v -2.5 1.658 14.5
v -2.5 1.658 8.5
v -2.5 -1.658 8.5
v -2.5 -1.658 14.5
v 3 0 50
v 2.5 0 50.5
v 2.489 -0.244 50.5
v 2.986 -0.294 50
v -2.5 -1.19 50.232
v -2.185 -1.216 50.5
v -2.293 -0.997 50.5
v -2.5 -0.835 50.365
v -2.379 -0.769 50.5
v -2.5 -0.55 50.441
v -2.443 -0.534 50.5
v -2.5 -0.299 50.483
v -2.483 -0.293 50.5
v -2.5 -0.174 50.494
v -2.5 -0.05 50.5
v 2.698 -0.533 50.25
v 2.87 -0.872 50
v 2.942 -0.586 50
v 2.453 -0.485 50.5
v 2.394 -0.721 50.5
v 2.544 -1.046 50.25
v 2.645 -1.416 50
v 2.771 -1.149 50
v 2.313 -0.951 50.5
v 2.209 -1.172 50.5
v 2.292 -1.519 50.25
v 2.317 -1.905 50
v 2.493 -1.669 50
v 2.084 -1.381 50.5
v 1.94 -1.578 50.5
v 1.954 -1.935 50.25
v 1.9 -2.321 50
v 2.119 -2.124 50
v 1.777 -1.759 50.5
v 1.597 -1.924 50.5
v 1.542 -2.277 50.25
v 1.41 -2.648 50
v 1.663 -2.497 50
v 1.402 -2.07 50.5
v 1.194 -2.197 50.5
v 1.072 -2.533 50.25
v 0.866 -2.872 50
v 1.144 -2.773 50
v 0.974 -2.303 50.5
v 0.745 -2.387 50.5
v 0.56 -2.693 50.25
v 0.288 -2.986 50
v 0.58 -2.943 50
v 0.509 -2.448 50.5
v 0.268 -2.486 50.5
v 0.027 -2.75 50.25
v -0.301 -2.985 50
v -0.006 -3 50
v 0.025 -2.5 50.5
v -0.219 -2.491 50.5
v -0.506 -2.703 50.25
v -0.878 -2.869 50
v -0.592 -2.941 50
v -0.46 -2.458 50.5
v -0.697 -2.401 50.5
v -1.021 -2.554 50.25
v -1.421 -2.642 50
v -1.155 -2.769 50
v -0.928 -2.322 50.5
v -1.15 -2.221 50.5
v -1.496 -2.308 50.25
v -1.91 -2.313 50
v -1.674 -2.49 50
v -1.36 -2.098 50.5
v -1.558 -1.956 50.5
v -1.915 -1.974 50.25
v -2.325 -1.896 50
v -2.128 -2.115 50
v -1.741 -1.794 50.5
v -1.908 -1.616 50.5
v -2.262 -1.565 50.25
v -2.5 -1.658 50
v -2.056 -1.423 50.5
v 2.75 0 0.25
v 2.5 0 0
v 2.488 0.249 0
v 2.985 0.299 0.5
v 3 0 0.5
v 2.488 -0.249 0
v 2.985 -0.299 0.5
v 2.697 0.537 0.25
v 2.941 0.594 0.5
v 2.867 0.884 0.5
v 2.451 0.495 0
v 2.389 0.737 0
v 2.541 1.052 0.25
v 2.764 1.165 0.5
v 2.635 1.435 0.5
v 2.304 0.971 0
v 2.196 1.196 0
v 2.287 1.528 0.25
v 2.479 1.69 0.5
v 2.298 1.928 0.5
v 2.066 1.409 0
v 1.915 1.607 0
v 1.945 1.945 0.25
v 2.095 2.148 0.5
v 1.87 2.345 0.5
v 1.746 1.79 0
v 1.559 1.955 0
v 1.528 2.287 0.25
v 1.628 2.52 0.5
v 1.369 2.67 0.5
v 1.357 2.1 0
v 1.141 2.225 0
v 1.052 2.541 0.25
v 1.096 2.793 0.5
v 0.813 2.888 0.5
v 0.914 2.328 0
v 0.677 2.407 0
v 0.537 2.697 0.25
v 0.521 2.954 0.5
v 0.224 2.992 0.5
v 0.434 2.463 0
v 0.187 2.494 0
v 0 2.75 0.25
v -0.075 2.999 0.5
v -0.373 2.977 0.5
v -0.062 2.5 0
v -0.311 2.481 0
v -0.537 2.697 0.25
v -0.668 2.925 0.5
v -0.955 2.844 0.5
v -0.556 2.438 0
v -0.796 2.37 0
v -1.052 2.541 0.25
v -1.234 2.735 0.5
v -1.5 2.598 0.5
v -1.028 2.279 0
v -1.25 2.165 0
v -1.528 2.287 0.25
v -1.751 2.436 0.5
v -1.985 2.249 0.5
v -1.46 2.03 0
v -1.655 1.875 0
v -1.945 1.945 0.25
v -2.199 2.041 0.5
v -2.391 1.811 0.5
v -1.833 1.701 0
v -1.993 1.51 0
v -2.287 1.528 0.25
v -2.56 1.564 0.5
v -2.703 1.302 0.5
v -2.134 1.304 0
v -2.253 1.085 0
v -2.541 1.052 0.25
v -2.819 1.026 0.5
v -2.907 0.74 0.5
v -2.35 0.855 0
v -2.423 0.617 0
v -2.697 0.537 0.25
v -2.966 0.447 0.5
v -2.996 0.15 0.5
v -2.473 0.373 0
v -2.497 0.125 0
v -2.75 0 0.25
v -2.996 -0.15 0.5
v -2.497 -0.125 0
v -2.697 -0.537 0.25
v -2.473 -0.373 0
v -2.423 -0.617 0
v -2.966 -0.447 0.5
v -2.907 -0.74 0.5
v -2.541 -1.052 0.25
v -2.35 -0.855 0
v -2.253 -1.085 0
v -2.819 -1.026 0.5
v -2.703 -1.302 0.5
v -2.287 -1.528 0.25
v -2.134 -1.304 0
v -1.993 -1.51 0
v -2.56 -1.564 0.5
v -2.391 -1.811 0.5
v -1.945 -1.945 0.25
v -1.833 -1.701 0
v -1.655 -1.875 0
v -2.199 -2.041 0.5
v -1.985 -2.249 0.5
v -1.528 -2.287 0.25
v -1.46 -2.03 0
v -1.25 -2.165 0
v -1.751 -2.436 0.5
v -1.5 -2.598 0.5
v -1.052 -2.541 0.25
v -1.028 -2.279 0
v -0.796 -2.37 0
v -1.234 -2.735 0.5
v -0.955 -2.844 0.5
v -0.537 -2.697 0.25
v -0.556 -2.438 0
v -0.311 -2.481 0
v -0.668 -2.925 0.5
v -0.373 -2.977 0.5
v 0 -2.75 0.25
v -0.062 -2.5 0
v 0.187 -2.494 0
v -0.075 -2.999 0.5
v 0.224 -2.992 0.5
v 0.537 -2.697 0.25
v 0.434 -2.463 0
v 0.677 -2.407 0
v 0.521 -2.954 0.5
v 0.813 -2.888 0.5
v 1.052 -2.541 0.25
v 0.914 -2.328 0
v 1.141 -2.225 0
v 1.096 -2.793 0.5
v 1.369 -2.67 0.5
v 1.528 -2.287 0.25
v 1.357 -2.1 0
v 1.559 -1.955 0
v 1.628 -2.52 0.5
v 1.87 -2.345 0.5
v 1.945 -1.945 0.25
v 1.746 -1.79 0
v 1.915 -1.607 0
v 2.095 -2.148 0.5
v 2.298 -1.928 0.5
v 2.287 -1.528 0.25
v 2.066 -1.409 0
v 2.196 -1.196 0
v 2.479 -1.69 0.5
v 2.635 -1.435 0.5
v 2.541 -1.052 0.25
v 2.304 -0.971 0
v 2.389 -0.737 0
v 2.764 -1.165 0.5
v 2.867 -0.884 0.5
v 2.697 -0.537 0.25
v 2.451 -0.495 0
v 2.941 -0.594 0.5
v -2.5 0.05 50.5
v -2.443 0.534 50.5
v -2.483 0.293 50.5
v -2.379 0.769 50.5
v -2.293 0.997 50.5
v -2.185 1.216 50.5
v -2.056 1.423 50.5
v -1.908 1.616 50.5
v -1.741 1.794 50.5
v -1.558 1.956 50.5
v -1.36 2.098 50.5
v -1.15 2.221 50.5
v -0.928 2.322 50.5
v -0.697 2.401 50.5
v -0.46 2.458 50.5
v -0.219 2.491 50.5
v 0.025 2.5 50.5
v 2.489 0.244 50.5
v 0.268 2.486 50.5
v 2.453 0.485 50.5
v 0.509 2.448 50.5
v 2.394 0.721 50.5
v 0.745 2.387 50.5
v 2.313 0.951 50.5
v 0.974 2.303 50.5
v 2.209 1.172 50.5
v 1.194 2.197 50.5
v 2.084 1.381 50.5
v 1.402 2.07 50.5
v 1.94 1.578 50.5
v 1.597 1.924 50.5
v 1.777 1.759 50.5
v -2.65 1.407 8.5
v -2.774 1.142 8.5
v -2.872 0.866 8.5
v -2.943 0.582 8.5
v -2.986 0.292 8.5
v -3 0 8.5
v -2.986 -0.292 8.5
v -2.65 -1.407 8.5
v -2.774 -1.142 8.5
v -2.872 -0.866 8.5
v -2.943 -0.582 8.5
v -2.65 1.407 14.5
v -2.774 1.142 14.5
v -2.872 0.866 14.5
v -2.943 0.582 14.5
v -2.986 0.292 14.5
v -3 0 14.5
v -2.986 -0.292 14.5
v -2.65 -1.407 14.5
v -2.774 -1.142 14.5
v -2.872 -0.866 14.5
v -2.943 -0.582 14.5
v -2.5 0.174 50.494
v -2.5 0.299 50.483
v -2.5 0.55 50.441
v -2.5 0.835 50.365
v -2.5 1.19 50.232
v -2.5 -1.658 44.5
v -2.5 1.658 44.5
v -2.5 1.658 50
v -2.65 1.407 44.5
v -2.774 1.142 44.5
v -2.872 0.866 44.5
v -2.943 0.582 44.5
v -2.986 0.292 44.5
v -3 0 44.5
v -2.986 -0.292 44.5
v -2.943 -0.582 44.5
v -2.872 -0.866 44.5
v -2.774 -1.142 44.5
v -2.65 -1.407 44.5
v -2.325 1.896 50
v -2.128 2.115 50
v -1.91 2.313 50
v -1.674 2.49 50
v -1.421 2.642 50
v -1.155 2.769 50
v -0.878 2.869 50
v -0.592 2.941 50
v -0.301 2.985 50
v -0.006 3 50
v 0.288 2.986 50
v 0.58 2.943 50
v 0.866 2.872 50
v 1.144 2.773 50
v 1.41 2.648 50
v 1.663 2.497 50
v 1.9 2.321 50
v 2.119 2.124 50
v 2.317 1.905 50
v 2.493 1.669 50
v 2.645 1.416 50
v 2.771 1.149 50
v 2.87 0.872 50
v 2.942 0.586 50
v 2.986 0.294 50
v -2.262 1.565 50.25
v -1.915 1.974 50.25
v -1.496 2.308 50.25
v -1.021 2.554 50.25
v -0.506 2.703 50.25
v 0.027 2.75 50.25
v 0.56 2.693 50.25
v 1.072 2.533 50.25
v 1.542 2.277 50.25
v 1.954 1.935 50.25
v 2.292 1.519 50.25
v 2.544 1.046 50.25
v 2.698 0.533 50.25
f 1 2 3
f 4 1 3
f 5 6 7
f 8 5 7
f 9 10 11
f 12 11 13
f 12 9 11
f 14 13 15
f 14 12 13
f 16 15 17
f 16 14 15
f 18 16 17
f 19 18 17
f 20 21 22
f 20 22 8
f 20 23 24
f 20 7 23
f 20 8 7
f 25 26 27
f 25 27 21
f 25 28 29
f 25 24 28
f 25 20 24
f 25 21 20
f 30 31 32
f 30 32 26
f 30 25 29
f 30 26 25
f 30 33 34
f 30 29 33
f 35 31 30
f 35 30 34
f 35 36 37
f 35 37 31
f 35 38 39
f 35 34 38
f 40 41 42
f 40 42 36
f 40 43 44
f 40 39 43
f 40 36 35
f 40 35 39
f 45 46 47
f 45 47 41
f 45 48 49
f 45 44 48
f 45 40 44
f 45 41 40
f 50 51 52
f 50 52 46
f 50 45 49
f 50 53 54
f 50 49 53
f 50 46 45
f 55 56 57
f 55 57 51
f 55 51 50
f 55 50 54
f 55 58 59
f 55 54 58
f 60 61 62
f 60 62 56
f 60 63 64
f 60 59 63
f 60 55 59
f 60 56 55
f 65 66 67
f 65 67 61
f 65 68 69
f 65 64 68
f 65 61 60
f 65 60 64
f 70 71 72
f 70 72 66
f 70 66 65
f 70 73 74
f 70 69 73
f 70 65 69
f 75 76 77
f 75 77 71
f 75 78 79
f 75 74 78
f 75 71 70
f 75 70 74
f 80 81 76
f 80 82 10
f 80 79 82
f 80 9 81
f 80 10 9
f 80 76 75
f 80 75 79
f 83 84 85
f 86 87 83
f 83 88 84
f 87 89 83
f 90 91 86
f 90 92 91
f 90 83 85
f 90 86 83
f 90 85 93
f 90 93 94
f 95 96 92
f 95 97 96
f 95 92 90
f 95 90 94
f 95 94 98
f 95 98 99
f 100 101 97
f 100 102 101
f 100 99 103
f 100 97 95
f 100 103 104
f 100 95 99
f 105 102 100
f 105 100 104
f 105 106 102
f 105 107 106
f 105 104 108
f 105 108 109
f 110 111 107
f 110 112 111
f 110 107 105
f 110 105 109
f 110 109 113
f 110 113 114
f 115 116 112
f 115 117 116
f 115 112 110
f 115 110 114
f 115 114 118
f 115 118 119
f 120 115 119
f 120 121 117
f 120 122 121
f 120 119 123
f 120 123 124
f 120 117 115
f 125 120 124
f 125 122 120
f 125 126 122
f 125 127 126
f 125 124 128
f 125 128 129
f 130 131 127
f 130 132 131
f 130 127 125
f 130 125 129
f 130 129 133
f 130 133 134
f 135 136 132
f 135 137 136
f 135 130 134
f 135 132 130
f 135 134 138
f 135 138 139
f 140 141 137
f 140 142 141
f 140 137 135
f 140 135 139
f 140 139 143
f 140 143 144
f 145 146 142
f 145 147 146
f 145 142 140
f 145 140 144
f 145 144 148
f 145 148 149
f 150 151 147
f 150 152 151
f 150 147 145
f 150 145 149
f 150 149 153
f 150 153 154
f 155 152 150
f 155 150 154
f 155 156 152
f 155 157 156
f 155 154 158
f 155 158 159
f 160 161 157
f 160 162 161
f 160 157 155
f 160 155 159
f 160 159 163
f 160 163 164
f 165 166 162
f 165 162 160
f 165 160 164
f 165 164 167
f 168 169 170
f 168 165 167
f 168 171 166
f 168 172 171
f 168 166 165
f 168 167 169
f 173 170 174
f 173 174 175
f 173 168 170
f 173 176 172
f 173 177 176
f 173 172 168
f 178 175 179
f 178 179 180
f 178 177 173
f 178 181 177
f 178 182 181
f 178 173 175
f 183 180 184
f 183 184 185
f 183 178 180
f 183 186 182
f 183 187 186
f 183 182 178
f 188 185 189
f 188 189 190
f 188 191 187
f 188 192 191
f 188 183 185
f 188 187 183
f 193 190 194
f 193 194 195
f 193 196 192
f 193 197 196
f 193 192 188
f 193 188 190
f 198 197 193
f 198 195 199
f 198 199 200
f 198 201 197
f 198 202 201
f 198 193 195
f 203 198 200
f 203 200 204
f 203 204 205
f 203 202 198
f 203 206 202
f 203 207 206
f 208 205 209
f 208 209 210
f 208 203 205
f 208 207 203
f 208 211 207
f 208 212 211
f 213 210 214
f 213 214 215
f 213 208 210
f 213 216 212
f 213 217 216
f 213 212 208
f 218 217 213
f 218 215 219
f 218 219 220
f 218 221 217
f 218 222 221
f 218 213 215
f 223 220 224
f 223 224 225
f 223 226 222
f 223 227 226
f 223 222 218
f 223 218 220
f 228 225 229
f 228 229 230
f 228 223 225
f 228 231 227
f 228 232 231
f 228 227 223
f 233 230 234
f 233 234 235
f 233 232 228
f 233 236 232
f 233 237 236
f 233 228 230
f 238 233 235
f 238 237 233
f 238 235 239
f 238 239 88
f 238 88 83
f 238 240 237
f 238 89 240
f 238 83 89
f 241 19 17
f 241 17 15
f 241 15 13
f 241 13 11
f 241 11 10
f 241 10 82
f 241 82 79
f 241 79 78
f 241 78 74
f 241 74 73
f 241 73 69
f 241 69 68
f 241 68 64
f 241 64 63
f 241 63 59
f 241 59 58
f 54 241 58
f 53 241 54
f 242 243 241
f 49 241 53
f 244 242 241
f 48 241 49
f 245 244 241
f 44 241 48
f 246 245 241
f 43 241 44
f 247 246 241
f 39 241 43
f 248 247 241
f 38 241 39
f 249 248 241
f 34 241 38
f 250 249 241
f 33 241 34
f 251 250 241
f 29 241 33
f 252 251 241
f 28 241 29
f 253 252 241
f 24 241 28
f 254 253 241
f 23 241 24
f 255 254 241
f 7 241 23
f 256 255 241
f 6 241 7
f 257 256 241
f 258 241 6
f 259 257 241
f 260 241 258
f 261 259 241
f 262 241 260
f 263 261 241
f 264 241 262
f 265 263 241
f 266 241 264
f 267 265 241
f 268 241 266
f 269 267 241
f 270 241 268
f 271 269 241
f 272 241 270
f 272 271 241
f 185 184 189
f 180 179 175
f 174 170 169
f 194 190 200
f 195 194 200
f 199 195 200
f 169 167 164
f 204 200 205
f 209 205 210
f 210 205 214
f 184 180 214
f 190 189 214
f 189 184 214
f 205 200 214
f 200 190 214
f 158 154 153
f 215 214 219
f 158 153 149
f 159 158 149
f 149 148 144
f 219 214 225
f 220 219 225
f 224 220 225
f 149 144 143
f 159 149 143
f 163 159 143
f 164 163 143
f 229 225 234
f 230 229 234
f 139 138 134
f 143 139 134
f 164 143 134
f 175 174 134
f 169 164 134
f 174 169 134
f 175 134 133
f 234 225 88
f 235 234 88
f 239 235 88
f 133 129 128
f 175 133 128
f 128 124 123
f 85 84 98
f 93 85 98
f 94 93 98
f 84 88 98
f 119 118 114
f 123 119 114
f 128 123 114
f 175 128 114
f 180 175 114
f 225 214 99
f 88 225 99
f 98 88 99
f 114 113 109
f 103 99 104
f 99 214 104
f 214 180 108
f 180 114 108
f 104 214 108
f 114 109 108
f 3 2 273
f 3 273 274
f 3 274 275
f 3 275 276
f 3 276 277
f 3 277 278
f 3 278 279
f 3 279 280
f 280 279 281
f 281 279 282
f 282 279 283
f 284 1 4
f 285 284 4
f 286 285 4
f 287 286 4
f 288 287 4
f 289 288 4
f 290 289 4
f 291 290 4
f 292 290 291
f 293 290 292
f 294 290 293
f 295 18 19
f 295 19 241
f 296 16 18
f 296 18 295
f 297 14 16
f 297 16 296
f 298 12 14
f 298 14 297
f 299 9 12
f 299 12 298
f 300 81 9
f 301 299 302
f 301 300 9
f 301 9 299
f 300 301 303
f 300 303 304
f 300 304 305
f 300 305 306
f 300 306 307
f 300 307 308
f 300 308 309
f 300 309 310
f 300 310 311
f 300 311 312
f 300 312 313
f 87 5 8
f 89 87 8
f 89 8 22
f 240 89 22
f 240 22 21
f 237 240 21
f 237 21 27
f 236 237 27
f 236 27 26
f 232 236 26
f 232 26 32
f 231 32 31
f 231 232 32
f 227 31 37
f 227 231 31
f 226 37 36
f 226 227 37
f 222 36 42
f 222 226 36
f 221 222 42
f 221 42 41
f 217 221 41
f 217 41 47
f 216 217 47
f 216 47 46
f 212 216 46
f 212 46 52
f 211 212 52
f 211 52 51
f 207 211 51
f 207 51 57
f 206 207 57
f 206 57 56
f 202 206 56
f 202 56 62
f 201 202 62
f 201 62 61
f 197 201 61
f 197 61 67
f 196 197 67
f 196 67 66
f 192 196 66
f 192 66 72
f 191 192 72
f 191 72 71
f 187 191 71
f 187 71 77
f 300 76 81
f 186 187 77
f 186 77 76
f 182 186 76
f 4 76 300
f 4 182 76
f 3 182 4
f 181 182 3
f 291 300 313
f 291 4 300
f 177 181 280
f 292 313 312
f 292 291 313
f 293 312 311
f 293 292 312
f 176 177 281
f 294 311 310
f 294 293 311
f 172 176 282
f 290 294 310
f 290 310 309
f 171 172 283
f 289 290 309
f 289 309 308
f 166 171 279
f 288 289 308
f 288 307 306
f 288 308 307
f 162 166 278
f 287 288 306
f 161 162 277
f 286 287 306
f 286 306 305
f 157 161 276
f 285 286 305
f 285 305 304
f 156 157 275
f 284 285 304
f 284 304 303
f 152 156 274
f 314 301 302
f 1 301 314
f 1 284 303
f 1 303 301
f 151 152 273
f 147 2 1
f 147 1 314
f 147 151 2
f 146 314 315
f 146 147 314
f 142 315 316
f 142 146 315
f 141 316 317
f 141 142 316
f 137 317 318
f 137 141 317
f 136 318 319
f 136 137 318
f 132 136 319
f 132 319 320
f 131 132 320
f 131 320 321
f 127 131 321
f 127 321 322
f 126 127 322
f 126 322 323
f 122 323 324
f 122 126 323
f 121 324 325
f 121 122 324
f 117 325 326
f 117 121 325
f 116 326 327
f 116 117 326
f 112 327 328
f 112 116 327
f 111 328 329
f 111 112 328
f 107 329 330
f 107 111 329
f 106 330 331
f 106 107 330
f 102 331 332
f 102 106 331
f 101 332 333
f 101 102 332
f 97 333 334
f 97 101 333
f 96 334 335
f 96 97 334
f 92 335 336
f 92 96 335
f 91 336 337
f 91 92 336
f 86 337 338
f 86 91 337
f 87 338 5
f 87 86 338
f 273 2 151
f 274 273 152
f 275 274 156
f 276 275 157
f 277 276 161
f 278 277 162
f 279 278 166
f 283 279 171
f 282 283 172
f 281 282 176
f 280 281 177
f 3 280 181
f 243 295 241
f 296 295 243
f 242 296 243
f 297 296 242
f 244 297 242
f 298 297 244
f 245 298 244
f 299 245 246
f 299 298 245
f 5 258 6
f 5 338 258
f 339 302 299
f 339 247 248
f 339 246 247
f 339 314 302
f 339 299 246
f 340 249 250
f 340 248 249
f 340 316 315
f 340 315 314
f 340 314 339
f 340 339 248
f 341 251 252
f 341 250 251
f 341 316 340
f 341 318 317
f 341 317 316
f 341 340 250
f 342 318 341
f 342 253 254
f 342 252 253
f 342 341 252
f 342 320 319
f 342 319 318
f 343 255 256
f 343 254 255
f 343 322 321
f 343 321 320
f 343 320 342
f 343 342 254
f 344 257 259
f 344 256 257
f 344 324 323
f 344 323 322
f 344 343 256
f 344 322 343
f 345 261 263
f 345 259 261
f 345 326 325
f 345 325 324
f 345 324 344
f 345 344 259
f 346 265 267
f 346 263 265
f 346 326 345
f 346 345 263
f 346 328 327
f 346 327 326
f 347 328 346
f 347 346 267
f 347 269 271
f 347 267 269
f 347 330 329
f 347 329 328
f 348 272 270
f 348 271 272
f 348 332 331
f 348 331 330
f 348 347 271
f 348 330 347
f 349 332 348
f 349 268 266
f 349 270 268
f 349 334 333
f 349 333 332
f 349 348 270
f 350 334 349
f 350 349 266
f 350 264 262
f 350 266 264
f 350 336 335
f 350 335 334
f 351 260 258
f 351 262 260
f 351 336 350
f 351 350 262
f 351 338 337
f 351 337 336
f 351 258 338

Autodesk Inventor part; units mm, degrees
ref_plane "YZ Plane" through (0, 0, 0) normal (1, 0, 0) x (0, 1, 0)
ref_plane "XZ Plane" through (0, 0, 0) normal (0, 1, 0) x (-1, 0, 0)
ref_plane "XY Plane" through (0, 0, 0) normal (0, 0, 1) x (1, 0, 0)
sketch "Skizze1" plane through (0, 0, 0) normal (0, 0, 1) x (1, 0, 0)
  circle A0 centre (0, 0) radius 3
  dimension "d0" = 6
extrude "Extrusion1" add sketch "Skizze1" along normal blind 8.5
sketch "Skizze2" plane through (0, 0, 8.5) normal (0, 0, 1) x (1, 0, 0)
  circle A0 centre (0, 0) radius 3 projected
  line L0 (-2.5, 1.6583) -> (-2.5, -1.6583)
  dimension "d3" = 2.5
extrude "Extrusion2" add sketch "Skizze2" along normal blind 6 contours A0 L0 picked at (-0.6667, 0)
sketch "Skizze3" plane through (0, 0, 14.5) normal (0, 0, 1) x (1, 0, 0)
  circle A0 centre (0, 0) radius 3 projected
extrude "Extrusion3" add sketch "Skizze3" along normal blind 30
sketch "Skizze4" plane through (0, 0, 44.5) normal (0, 0, 1) x (1, 0, 0)
  line L0 (-2.5, -1.6583) -> (-2.5, 1.6583) projected
  arc A0 (-2.5, 1.6583) -> (-2.5, -1.6583) centre (0, 0) ccw projected
  circle A1 centre (0, 0) radius 3 projected
extrude "Extrusion4" add sketch "Skizze4" along normal blind 6 contours L0 A1
chamfer "Fase1" distance 0.5 angle 45 3 edges at (-3, 0, 0) (0.866, -2.8723, 50.5) (0.866, 2.8723, 50.5)
properties part number "Welle_wrist" material "Edelstahl"
